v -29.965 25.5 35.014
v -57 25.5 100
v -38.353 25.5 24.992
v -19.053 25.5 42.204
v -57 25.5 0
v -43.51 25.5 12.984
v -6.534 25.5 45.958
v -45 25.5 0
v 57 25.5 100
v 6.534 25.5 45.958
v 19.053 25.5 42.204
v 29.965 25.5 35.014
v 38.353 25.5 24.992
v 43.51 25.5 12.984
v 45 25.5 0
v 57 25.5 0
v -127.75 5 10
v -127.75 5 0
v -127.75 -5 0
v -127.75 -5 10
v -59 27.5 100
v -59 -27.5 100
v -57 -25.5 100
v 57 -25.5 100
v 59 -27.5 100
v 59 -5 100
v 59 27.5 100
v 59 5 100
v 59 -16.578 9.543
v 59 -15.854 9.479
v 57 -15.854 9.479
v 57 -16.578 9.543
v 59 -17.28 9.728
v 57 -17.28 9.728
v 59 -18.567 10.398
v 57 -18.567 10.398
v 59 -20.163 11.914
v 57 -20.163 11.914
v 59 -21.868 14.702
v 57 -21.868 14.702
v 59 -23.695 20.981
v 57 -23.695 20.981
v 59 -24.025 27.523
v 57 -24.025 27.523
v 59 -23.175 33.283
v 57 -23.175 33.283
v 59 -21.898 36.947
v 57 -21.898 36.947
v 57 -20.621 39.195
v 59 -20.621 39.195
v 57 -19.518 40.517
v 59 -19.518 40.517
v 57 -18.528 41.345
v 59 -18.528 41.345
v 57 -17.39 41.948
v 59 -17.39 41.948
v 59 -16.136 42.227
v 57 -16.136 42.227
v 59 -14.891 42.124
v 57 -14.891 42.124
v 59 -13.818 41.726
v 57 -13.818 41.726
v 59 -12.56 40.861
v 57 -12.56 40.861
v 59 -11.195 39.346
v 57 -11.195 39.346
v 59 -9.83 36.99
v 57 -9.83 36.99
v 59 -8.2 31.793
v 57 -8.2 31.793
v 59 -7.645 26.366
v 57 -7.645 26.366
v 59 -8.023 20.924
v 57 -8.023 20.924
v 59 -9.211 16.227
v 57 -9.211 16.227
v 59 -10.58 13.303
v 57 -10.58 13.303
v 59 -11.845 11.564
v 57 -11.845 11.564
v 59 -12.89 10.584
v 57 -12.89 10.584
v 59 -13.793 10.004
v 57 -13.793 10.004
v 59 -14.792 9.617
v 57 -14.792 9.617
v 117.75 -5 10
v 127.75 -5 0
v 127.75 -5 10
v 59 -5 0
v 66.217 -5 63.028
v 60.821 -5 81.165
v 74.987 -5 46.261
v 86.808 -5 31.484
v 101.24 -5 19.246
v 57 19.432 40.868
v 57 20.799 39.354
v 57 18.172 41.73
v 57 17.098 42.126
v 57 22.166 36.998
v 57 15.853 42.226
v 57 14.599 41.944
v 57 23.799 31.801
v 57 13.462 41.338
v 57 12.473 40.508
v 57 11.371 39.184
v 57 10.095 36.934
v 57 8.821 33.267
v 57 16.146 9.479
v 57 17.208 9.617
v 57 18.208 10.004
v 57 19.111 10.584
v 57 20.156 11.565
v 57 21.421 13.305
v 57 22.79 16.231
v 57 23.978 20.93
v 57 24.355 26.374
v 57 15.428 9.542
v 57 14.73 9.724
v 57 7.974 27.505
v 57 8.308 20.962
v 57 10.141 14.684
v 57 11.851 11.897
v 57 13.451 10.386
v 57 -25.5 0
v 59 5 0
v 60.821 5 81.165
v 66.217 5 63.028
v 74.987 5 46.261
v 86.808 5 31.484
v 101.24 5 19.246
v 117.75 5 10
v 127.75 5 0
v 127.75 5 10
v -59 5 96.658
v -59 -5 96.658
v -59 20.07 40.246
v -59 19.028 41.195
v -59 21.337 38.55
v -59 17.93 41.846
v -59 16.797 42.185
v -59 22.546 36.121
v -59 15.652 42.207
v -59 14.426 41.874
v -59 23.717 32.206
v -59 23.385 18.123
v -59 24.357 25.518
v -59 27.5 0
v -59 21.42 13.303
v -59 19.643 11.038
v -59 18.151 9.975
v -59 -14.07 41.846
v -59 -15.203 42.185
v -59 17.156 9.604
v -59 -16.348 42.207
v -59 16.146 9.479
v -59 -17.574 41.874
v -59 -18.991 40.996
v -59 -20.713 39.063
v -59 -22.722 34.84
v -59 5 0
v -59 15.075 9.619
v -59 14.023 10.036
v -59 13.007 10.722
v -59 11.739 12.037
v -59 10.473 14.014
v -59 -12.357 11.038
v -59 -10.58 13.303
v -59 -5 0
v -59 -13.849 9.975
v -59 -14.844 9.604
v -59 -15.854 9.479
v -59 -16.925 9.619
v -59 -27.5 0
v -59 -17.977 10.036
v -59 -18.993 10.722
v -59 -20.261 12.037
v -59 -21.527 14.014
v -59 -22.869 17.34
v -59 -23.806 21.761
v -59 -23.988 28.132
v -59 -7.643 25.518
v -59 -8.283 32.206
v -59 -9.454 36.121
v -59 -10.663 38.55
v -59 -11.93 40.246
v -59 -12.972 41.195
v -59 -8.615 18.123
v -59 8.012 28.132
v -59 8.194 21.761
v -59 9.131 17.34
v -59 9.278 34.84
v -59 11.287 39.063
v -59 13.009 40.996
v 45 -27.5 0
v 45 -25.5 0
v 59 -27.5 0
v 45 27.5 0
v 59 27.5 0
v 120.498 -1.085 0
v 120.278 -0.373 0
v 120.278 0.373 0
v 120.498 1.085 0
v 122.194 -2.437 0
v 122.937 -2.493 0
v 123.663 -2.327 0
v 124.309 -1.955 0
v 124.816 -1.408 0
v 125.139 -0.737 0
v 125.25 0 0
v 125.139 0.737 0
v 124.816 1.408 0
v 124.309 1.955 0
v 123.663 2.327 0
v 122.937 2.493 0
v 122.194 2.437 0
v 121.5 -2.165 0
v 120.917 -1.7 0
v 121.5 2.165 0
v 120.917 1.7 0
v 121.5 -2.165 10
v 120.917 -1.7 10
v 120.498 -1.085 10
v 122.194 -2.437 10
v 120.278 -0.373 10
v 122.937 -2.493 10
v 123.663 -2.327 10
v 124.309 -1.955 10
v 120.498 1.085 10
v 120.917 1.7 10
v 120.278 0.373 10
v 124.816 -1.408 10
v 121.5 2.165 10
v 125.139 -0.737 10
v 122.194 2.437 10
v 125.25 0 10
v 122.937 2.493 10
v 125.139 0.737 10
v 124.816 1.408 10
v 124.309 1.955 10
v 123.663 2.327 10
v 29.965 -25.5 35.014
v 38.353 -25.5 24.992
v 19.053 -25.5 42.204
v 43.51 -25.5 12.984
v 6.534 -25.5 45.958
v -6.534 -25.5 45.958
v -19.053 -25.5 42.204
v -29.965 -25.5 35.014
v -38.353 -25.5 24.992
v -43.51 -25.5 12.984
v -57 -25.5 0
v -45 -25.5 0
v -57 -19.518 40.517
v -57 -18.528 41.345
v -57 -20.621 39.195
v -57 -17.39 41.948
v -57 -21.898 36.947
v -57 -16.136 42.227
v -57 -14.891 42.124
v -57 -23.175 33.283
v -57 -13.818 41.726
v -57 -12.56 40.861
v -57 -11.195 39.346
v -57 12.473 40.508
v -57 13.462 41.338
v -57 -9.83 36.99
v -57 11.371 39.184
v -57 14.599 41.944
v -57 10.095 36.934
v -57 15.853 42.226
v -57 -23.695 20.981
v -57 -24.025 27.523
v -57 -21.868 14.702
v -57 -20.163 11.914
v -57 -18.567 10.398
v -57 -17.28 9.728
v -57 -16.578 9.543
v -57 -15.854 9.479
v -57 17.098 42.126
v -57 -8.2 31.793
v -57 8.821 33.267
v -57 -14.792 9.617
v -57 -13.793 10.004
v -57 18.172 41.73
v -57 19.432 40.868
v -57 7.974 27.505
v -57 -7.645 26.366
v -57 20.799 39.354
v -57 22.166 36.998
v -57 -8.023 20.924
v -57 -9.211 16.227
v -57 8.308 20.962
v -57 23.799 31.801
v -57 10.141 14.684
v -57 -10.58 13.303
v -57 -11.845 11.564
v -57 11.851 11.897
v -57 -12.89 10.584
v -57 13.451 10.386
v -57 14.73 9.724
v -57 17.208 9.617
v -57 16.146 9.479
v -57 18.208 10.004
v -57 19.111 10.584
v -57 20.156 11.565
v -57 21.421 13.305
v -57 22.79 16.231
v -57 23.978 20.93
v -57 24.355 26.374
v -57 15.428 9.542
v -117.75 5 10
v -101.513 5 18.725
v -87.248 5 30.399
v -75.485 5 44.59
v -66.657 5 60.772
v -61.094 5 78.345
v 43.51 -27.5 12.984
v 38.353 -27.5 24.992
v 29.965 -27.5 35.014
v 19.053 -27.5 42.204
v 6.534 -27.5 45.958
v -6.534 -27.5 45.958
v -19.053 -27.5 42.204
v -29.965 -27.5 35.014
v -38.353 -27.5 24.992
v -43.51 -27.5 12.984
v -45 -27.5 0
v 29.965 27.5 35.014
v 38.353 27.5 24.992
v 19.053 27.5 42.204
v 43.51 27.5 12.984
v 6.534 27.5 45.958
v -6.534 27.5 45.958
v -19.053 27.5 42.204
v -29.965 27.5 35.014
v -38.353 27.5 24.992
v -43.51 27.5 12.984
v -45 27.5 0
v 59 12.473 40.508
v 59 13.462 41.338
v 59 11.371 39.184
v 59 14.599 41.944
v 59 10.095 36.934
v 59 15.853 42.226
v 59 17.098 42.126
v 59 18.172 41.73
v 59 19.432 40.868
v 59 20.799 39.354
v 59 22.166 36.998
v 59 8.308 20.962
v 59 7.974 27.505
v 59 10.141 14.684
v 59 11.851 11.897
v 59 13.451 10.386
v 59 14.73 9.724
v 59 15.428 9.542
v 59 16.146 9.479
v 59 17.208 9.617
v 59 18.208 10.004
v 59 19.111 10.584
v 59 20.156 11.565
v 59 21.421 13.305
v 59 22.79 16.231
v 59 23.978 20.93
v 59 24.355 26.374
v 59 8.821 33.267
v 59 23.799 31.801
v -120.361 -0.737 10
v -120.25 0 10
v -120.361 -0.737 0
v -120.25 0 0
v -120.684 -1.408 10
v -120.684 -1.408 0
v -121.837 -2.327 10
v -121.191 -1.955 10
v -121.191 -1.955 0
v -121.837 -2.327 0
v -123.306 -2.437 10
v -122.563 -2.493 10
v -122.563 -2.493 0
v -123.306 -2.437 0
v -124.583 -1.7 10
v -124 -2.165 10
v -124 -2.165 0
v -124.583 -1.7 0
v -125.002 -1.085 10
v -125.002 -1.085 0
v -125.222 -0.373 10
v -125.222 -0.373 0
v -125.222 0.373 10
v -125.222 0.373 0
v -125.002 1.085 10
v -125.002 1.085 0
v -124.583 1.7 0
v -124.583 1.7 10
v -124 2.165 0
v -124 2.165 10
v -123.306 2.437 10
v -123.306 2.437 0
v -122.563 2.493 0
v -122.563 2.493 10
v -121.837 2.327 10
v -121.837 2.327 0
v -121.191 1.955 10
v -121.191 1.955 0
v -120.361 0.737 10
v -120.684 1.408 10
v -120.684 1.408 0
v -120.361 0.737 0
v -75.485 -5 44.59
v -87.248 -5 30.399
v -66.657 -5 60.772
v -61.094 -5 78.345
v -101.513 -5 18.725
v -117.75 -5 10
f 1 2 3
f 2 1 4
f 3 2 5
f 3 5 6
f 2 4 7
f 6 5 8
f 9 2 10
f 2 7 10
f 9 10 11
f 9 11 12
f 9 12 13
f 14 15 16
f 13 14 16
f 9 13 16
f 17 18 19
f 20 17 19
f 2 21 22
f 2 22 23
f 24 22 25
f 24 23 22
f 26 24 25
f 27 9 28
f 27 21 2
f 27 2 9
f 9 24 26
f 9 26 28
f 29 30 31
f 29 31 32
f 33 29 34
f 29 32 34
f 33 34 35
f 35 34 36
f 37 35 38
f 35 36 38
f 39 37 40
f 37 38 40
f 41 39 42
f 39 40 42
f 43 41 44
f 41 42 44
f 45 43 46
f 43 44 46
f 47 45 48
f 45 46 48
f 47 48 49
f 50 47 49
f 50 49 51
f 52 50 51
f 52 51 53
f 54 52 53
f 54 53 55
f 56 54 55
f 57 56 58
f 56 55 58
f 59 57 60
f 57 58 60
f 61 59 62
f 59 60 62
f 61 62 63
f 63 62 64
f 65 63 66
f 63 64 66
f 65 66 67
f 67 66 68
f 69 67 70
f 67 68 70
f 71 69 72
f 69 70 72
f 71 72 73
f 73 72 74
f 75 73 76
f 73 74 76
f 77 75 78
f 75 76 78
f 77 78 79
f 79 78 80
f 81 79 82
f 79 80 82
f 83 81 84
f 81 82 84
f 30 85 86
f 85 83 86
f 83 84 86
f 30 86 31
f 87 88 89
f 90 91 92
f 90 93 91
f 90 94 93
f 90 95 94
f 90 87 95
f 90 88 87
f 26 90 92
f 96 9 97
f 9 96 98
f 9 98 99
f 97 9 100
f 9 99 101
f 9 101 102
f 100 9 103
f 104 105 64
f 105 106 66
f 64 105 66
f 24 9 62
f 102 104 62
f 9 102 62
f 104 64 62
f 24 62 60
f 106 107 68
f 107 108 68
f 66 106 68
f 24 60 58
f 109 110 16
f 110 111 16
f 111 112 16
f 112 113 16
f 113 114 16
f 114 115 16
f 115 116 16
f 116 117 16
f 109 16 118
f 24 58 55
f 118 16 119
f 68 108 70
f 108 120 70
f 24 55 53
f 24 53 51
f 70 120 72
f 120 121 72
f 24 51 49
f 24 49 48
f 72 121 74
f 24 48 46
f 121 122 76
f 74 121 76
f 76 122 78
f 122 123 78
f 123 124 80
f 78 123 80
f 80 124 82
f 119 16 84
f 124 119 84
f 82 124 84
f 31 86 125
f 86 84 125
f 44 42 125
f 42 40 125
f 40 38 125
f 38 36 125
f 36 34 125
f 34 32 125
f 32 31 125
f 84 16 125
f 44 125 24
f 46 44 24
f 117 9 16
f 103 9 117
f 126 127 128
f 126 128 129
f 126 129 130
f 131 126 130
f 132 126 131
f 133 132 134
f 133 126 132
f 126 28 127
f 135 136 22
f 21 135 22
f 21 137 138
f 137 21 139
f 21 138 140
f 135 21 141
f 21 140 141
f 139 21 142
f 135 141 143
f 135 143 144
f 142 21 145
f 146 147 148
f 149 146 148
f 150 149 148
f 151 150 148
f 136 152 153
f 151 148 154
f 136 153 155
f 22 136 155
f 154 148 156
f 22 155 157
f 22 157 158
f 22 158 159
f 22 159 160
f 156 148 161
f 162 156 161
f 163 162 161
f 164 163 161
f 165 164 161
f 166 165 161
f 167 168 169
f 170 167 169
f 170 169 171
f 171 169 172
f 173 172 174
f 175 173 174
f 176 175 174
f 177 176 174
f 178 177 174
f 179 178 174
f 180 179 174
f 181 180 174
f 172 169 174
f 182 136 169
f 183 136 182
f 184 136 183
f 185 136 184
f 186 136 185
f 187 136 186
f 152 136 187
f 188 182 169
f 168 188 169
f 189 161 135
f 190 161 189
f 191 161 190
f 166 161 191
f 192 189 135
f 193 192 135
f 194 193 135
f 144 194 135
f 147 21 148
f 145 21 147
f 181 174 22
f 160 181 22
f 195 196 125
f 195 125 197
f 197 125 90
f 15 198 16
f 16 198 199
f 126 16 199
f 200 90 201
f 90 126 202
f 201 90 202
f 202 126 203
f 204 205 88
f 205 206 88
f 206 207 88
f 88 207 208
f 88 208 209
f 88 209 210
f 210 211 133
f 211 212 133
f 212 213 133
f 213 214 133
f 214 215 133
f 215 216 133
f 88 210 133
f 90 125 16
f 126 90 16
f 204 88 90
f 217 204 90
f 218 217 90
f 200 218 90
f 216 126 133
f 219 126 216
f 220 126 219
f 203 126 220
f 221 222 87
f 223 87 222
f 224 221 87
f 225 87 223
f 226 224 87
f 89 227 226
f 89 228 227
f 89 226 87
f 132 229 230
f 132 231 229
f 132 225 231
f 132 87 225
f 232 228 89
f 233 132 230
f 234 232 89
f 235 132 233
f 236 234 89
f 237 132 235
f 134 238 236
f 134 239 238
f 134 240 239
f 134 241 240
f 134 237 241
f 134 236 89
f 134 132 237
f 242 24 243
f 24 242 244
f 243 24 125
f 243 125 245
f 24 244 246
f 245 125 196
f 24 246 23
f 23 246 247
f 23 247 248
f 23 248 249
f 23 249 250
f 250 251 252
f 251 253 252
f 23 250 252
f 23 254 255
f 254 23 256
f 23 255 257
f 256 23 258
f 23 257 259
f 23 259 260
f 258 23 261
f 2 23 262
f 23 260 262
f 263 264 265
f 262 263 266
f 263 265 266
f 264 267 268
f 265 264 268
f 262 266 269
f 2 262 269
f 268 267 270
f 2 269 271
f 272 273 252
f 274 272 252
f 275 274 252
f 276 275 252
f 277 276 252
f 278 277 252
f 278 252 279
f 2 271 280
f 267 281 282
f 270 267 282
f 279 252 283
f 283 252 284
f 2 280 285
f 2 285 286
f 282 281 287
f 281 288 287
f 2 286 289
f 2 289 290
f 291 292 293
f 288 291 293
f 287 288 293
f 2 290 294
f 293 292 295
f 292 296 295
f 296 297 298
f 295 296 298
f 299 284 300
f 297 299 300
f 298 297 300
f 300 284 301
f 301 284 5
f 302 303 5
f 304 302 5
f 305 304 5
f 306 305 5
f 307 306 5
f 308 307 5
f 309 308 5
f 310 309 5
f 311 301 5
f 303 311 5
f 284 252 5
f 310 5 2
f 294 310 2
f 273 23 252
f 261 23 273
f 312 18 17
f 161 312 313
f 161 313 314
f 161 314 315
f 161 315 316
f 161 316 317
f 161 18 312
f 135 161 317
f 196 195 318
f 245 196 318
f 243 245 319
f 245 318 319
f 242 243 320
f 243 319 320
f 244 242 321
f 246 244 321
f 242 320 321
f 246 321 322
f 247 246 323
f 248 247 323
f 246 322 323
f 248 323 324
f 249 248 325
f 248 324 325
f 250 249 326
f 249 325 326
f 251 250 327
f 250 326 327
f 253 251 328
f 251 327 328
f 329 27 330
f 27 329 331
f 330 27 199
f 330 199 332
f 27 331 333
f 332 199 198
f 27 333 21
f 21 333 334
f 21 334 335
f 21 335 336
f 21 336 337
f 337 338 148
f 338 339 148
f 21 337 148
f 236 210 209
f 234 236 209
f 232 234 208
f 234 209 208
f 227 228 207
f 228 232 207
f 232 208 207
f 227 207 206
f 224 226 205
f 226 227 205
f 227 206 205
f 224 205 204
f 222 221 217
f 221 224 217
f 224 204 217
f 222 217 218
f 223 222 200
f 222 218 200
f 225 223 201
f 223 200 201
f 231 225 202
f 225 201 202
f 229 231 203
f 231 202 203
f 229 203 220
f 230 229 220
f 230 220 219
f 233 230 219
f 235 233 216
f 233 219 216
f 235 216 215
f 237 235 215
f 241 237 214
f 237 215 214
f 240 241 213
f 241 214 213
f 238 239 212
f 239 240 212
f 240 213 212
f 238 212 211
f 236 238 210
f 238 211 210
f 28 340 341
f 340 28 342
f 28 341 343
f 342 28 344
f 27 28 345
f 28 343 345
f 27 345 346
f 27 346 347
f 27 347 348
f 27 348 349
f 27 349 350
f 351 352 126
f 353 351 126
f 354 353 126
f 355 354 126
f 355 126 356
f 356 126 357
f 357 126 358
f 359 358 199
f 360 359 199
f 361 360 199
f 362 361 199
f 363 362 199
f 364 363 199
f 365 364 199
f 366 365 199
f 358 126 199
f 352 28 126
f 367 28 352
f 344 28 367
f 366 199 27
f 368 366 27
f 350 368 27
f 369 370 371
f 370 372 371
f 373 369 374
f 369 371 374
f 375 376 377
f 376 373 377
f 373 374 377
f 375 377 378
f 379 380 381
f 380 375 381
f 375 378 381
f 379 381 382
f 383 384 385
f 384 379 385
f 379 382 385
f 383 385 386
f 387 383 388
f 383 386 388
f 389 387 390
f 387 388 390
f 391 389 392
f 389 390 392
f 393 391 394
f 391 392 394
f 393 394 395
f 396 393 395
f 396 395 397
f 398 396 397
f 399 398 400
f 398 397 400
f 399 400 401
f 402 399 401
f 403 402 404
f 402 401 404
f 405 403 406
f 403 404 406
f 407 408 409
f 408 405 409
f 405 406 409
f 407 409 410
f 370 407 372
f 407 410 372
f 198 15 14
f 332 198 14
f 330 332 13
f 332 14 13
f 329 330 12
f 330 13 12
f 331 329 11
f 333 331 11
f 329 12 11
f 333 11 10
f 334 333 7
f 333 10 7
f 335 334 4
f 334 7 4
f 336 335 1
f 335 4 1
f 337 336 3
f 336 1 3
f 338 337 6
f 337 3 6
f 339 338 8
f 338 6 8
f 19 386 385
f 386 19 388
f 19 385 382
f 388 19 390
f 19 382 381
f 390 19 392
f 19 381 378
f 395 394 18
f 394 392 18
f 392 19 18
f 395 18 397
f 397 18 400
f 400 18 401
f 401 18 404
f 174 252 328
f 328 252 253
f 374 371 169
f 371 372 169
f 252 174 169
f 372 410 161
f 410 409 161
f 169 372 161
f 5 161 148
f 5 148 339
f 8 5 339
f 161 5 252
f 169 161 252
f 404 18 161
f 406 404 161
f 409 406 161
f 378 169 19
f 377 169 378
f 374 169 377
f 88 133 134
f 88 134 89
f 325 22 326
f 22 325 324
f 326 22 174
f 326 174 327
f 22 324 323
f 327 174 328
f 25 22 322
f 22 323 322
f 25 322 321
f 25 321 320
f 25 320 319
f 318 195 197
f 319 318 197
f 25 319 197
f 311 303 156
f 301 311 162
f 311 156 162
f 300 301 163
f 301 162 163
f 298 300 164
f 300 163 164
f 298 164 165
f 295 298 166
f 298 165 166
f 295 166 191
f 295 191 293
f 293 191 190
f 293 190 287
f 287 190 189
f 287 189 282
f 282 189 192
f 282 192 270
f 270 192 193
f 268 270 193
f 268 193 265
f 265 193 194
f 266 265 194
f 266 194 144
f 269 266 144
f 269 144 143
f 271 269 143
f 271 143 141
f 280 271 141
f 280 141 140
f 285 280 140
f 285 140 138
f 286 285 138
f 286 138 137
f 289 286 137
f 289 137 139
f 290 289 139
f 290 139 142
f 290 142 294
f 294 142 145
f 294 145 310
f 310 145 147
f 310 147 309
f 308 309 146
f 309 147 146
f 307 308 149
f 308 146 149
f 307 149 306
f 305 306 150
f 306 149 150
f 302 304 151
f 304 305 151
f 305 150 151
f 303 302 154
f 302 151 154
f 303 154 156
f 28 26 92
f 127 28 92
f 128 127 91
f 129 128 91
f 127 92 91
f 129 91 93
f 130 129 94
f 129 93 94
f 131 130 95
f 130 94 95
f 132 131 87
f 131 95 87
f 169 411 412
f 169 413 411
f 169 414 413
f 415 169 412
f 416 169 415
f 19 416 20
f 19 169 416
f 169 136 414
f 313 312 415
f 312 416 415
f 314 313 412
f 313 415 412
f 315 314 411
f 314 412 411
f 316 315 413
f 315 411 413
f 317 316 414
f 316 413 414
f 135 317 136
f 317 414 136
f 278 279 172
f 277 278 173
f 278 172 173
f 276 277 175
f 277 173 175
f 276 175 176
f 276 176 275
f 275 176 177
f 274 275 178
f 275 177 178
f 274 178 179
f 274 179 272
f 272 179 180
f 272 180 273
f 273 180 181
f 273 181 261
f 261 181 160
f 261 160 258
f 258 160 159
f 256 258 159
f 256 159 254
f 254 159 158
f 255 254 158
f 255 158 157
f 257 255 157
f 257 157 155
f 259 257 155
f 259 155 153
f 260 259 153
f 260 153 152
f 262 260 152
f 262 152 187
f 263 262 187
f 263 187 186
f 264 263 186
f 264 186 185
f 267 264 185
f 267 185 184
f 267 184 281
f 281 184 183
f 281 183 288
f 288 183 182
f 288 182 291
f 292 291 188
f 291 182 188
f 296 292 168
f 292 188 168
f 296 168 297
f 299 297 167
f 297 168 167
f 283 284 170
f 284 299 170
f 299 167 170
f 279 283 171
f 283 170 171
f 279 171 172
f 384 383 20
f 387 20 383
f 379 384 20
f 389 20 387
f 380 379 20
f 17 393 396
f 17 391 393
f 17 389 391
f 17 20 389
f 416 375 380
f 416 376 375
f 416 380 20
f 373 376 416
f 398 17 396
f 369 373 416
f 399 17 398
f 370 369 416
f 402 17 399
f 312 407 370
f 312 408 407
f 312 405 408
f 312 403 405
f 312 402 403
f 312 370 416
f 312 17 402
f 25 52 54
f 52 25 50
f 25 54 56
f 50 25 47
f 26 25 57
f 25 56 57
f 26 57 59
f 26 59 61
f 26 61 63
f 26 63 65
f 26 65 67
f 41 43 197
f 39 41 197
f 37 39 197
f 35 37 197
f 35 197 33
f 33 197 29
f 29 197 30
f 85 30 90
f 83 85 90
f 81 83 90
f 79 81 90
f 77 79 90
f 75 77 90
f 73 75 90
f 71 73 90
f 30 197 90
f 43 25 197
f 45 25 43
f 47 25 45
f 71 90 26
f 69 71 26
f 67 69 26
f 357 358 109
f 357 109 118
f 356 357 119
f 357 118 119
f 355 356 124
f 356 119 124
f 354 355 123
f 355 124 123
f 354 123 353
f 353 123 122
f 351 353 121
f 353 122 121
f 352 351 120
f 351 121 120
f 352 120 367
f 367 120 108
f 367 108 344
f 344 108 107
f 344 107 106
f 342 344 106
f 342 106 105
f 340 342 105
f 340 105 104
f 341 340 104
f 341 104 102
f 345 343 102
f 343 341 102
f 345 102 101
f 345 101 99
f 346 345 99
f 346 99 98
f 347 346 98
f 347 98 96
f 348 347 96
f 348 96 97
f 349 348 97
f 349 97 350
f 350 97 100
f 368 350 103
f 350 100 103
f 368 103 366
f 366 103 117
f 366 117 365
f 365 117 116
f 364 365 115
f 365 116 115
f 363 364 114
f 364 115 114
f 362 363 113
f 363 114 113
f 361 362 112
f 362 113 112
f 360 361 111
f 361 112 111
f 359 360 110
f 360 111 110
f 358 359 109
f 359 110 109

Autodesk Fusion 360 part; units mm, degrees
sketch "Sketch1" plane through (0, 0, 0) normal (0, 0, 1) x (1, 0, 0)
  line L0 (0, 0) -> (-122.75, 0) construction
  line L1 (0, 0) -> (0, 25.25) construction
  line L2 (0, 0) -> (122.75, 0) construction
  line L3 (0, 0) -> (0, -25.25) construction
  circle A0 centre (-122.75, 0) radius 2.5
  circle A1 centre (122.75, 0) radius 2.5
  line L4 (-57, 25.5) -> (57, 25.5)
  line L5 (57, 25.5) -> (57, -25.5)
  line L6 (57, -25.5) -> (-57, -25.5)
  line L7 (-57, -25.5) -> (-57, 25.5)
  line L8 (-57, 25.5) -> (57, -25.5) construction
  line L9 (57, 25.5) -> (-57, -25.5) construction
  line L10 (-117.75, 5) -> (-127.75, 5)
  line L11 (-127.75, 5) -> (-127.75, -5)
  line L12 (-127.75, -5) -> (-117.75, -5)
  line L13 (-117.75, -5) -> (-117.75, 5)
  line L14 (-117.75, 5) -> (-127.75, -5) construction
  line L15 (-127.75, 5) -> (-117.75, -5) construction
  line L16 (-117.75, 5) -> (-57, 5)
  line L17 (-57, 5) -> (-57, -5)
  line L18 (-57, -5) -> (-117.75, -5)
  line L19 (-117.75, -5) -> (-117.75, 5)
  line L20 (117.75, -5) -> (117.75, 5)
  line L21 (127.75, 5) -> (127.75, -5)
  line L22 (117.75, 5) -> (127.75, -5) construction
  line L23 (117.75, -5) -> (117.75, 5)
  line L24 (127.75, 5) -> (117.75, -5) construction
  line L25 (127.75, -5) -> (117.75, -5)
  line L26 (117.75, 5) -> (127.75, 5)
  circle A2 centre (122.75, 0) radius 2.5
  line L27 (117.75, 5) -> (57, 5)
  line L28 (57, -5) -> (117.75, -5)
  line L29 (59, 27.5) -> (-59, 27.5)
  line L30 (-59, 27.5) -> (-59, -27.5)
  line L31 (-59, -27.5) -> (59, -27.5)
  line L32 (59, -27.5) -> (59, 27.5)
  line L33 (59, 27.5) -> (-59, -27.5) construction
  line L34 (-59, 27.5) -> (59, -27.5) construction
  point P0 (-122.75, 0)
  point P1 (122.75, 0)
  point P2 (122.75, 0)
  dimension "d1" = 122.75
  dimension "d2" = 25.25
  dimension "d3" = 5
  dimension "d4" = 114
  dimension "d5" = 51
  dimension "d6" = 10
  dimension "d7" = 10
  dimension "d8" = 10
  dimension "d19" = 118
  dimension "d20" = 55
extrude "Extrude2" add sketch "Sketch1" along normal blind 10 contours L10 L11 L12 L13 L19 | L20 L21 L23 L25 L26 makes body 1 at (125.2469, -0.1246, 6.6667) makes body 2 at (-120.2531, -0.1246, 6.6667)
sketch "Sketch2" plane through (0, 5, 0) normal (0, 1, 0) x (-1, 0, 0)
  line L0 (117.75, 0) -> (127.75, 0)
  line L1 (127.75, 0) -> (127.75, 10)
  line L2 (127.75, 10) -> (117.75, 10)
  arc A0 (57, 100) -> (117.75, 10) centre (154.0417, 100) ccw
  line L3 (117.75, 10) -> (117.75, 0)
sketch "Sketch3" plane through (0, 5, 0) normal (0, 1, 0) x (-1, 0, 0)
  line L0 (-127.75, 0) -> (-117.75, 0)
  line L1 (-117.75, 10) -> (-127.75, 10)
  line L2 (-127.75, 10) -> (-127.75, 0)
  arc A0 (-117.75, 10) -> (-57, 100) centre (-154.0417, 100) ccw
  line L3 (-117.75, 0) -> (-117.75, 10)
extrude "Extrude7" add sketch "Sketch1" along normal blind 100 separate body contours L4 L5 L7 L16 L27 L29 L30 L32 | L7 L16 L17 L18 L30 | L5 L27 L28 L32 | L5 L6 L7 L18 L28 L30 L31 L32 makes body 3
extrude "Extrude8" add sketch "Sketch1" along normal blind 100 contours L13 L16 L18 L19 L30 | L20 L23 L27 L28 L32 bodies 1 2 3
sketch "Sketch4" plane through (0, -5, 0) normal (0, -1, 0) x (1, 0, 0)
  line L0 (-127.75, 0) -> (-59, 0)
  line L1 (-59, 0) -> (-59, 100)
  line L2 (-59, 100) -> (-117.75, 100)
  line L3 (-117.75, 100) -> (-117.75, 10)
  line L4 (-117.75, 10) -> (-127.75, 10)
  line L5 (-127.75, 10) -> (-127.75, 0)
  arc A0 (-117.75, 10) -> (-59, 100) centre (-154.7515, 98.3291) ccw
sketch "Sketch5" plane through (0, -5, 0) normal (0, -1, 0) x (1, 0, 0)
  line L0 (59, 0) -> (127.75, 0)
  line L1 (127.75, 0) -> (127.75, 10)
  line L2 (127.75, 10) -> (117.75, 10)
  line L3 (117.75, 10) -> (117.75, 100)
  line L4 (117.75, 100) -> (59, 100)
  line L5 (59, 100) -> (59, 0)
  arc A0 (59, 100) -> (117.75, 10) centre (157.3112, 100) ccw
extrude "Extrude9" cut sketch "Sketch5" sketch "Sketch4" against normal blind 35 contours L3 L4 A0 of sketch 2 contours L1 L2 L3 A0 bodies 1
sketch "Sketch6" plane through (0, -27.5, 0) normal (0, -1, 0) x (1, 0, 0)
  line L0 (-59, 0) -> (59, 0)
  line L1 (59, 0) -> (59, 100)
  line L2 (59, 100) -> (-59, 100)
  line L3 (-59, 100) -> (-59, 0)
  line L4 (-45, 0) -> (45, 0) construction
  line L5 (45, 0) -> (45, 37.4909) construction
  line L6 (45, 37.4909) -> (-45, 37.4909) construction
  line L7 (-45, 37.4909) -> (-45, 0) construction
  line L8 (-45, 0) -> (45, 37.4909) construction
  line L9 (45, 0) -> (-45, 37.4909) construction
  arc A0 (45, 0) -> (-45, 0) centre (0, 1.4121) ccw
  point P0 (0, 18.7455)
  dimension "d29" = 90
extrude "Extrude10" cut sketch "Sketch6" against normal blind 95 contours L0 A0 bodies 1
sketch "Sketch7" plane through (-59, 0, 0) normal (-1, 0, 0) x (0, -1, 0)
  line L0 (-27.5, 100) -> (-27.5, 0)
  line L1 (-27.5, 0) -> (-5, 0)
  line L2 (-5, 0) -> (-5, 96.6583)
  line L3 (-5, 96.6583) -> (5, 96.6583)
  line L4 (5, 96.6583) -> (5, 0)
  line L5 (5, 0) -> (27.5, 0)
  line L6 (27.5, 0) -> (27.5, 100)
  line L7 (27.5, 100) -> (-27.5, 100)
  ellipse E0 centre (-16.1457, 25.858) end of major axis (-16.1457, 9.4792) minor radius 8.2129
  line L8 (-16.1457, 42.2368) -> (-16.1457, 9.4792) construction
  line L9 (-24.3586, 25.858) -> (-7.9328, 25.858) construction
  ellipse E1 centre (15.8543, 25.858) end of major axis (15.8543, 9.4792) minor radius 8.2129
  line L10 (15.8543, 42.2368) -> (15.8543, 9.4792) construction
  line L11 (7.6414, 25.858) -> (24.0672, 25.858) construction
  point P0 (-16.1457, 25.858)
extrude "Extrude11" cut sketch "Sketch7" against normal blind 145 contours E0 | E1 bodies 1
equation "d1 = ( 245.5 / 2 ) * 1 mm"
